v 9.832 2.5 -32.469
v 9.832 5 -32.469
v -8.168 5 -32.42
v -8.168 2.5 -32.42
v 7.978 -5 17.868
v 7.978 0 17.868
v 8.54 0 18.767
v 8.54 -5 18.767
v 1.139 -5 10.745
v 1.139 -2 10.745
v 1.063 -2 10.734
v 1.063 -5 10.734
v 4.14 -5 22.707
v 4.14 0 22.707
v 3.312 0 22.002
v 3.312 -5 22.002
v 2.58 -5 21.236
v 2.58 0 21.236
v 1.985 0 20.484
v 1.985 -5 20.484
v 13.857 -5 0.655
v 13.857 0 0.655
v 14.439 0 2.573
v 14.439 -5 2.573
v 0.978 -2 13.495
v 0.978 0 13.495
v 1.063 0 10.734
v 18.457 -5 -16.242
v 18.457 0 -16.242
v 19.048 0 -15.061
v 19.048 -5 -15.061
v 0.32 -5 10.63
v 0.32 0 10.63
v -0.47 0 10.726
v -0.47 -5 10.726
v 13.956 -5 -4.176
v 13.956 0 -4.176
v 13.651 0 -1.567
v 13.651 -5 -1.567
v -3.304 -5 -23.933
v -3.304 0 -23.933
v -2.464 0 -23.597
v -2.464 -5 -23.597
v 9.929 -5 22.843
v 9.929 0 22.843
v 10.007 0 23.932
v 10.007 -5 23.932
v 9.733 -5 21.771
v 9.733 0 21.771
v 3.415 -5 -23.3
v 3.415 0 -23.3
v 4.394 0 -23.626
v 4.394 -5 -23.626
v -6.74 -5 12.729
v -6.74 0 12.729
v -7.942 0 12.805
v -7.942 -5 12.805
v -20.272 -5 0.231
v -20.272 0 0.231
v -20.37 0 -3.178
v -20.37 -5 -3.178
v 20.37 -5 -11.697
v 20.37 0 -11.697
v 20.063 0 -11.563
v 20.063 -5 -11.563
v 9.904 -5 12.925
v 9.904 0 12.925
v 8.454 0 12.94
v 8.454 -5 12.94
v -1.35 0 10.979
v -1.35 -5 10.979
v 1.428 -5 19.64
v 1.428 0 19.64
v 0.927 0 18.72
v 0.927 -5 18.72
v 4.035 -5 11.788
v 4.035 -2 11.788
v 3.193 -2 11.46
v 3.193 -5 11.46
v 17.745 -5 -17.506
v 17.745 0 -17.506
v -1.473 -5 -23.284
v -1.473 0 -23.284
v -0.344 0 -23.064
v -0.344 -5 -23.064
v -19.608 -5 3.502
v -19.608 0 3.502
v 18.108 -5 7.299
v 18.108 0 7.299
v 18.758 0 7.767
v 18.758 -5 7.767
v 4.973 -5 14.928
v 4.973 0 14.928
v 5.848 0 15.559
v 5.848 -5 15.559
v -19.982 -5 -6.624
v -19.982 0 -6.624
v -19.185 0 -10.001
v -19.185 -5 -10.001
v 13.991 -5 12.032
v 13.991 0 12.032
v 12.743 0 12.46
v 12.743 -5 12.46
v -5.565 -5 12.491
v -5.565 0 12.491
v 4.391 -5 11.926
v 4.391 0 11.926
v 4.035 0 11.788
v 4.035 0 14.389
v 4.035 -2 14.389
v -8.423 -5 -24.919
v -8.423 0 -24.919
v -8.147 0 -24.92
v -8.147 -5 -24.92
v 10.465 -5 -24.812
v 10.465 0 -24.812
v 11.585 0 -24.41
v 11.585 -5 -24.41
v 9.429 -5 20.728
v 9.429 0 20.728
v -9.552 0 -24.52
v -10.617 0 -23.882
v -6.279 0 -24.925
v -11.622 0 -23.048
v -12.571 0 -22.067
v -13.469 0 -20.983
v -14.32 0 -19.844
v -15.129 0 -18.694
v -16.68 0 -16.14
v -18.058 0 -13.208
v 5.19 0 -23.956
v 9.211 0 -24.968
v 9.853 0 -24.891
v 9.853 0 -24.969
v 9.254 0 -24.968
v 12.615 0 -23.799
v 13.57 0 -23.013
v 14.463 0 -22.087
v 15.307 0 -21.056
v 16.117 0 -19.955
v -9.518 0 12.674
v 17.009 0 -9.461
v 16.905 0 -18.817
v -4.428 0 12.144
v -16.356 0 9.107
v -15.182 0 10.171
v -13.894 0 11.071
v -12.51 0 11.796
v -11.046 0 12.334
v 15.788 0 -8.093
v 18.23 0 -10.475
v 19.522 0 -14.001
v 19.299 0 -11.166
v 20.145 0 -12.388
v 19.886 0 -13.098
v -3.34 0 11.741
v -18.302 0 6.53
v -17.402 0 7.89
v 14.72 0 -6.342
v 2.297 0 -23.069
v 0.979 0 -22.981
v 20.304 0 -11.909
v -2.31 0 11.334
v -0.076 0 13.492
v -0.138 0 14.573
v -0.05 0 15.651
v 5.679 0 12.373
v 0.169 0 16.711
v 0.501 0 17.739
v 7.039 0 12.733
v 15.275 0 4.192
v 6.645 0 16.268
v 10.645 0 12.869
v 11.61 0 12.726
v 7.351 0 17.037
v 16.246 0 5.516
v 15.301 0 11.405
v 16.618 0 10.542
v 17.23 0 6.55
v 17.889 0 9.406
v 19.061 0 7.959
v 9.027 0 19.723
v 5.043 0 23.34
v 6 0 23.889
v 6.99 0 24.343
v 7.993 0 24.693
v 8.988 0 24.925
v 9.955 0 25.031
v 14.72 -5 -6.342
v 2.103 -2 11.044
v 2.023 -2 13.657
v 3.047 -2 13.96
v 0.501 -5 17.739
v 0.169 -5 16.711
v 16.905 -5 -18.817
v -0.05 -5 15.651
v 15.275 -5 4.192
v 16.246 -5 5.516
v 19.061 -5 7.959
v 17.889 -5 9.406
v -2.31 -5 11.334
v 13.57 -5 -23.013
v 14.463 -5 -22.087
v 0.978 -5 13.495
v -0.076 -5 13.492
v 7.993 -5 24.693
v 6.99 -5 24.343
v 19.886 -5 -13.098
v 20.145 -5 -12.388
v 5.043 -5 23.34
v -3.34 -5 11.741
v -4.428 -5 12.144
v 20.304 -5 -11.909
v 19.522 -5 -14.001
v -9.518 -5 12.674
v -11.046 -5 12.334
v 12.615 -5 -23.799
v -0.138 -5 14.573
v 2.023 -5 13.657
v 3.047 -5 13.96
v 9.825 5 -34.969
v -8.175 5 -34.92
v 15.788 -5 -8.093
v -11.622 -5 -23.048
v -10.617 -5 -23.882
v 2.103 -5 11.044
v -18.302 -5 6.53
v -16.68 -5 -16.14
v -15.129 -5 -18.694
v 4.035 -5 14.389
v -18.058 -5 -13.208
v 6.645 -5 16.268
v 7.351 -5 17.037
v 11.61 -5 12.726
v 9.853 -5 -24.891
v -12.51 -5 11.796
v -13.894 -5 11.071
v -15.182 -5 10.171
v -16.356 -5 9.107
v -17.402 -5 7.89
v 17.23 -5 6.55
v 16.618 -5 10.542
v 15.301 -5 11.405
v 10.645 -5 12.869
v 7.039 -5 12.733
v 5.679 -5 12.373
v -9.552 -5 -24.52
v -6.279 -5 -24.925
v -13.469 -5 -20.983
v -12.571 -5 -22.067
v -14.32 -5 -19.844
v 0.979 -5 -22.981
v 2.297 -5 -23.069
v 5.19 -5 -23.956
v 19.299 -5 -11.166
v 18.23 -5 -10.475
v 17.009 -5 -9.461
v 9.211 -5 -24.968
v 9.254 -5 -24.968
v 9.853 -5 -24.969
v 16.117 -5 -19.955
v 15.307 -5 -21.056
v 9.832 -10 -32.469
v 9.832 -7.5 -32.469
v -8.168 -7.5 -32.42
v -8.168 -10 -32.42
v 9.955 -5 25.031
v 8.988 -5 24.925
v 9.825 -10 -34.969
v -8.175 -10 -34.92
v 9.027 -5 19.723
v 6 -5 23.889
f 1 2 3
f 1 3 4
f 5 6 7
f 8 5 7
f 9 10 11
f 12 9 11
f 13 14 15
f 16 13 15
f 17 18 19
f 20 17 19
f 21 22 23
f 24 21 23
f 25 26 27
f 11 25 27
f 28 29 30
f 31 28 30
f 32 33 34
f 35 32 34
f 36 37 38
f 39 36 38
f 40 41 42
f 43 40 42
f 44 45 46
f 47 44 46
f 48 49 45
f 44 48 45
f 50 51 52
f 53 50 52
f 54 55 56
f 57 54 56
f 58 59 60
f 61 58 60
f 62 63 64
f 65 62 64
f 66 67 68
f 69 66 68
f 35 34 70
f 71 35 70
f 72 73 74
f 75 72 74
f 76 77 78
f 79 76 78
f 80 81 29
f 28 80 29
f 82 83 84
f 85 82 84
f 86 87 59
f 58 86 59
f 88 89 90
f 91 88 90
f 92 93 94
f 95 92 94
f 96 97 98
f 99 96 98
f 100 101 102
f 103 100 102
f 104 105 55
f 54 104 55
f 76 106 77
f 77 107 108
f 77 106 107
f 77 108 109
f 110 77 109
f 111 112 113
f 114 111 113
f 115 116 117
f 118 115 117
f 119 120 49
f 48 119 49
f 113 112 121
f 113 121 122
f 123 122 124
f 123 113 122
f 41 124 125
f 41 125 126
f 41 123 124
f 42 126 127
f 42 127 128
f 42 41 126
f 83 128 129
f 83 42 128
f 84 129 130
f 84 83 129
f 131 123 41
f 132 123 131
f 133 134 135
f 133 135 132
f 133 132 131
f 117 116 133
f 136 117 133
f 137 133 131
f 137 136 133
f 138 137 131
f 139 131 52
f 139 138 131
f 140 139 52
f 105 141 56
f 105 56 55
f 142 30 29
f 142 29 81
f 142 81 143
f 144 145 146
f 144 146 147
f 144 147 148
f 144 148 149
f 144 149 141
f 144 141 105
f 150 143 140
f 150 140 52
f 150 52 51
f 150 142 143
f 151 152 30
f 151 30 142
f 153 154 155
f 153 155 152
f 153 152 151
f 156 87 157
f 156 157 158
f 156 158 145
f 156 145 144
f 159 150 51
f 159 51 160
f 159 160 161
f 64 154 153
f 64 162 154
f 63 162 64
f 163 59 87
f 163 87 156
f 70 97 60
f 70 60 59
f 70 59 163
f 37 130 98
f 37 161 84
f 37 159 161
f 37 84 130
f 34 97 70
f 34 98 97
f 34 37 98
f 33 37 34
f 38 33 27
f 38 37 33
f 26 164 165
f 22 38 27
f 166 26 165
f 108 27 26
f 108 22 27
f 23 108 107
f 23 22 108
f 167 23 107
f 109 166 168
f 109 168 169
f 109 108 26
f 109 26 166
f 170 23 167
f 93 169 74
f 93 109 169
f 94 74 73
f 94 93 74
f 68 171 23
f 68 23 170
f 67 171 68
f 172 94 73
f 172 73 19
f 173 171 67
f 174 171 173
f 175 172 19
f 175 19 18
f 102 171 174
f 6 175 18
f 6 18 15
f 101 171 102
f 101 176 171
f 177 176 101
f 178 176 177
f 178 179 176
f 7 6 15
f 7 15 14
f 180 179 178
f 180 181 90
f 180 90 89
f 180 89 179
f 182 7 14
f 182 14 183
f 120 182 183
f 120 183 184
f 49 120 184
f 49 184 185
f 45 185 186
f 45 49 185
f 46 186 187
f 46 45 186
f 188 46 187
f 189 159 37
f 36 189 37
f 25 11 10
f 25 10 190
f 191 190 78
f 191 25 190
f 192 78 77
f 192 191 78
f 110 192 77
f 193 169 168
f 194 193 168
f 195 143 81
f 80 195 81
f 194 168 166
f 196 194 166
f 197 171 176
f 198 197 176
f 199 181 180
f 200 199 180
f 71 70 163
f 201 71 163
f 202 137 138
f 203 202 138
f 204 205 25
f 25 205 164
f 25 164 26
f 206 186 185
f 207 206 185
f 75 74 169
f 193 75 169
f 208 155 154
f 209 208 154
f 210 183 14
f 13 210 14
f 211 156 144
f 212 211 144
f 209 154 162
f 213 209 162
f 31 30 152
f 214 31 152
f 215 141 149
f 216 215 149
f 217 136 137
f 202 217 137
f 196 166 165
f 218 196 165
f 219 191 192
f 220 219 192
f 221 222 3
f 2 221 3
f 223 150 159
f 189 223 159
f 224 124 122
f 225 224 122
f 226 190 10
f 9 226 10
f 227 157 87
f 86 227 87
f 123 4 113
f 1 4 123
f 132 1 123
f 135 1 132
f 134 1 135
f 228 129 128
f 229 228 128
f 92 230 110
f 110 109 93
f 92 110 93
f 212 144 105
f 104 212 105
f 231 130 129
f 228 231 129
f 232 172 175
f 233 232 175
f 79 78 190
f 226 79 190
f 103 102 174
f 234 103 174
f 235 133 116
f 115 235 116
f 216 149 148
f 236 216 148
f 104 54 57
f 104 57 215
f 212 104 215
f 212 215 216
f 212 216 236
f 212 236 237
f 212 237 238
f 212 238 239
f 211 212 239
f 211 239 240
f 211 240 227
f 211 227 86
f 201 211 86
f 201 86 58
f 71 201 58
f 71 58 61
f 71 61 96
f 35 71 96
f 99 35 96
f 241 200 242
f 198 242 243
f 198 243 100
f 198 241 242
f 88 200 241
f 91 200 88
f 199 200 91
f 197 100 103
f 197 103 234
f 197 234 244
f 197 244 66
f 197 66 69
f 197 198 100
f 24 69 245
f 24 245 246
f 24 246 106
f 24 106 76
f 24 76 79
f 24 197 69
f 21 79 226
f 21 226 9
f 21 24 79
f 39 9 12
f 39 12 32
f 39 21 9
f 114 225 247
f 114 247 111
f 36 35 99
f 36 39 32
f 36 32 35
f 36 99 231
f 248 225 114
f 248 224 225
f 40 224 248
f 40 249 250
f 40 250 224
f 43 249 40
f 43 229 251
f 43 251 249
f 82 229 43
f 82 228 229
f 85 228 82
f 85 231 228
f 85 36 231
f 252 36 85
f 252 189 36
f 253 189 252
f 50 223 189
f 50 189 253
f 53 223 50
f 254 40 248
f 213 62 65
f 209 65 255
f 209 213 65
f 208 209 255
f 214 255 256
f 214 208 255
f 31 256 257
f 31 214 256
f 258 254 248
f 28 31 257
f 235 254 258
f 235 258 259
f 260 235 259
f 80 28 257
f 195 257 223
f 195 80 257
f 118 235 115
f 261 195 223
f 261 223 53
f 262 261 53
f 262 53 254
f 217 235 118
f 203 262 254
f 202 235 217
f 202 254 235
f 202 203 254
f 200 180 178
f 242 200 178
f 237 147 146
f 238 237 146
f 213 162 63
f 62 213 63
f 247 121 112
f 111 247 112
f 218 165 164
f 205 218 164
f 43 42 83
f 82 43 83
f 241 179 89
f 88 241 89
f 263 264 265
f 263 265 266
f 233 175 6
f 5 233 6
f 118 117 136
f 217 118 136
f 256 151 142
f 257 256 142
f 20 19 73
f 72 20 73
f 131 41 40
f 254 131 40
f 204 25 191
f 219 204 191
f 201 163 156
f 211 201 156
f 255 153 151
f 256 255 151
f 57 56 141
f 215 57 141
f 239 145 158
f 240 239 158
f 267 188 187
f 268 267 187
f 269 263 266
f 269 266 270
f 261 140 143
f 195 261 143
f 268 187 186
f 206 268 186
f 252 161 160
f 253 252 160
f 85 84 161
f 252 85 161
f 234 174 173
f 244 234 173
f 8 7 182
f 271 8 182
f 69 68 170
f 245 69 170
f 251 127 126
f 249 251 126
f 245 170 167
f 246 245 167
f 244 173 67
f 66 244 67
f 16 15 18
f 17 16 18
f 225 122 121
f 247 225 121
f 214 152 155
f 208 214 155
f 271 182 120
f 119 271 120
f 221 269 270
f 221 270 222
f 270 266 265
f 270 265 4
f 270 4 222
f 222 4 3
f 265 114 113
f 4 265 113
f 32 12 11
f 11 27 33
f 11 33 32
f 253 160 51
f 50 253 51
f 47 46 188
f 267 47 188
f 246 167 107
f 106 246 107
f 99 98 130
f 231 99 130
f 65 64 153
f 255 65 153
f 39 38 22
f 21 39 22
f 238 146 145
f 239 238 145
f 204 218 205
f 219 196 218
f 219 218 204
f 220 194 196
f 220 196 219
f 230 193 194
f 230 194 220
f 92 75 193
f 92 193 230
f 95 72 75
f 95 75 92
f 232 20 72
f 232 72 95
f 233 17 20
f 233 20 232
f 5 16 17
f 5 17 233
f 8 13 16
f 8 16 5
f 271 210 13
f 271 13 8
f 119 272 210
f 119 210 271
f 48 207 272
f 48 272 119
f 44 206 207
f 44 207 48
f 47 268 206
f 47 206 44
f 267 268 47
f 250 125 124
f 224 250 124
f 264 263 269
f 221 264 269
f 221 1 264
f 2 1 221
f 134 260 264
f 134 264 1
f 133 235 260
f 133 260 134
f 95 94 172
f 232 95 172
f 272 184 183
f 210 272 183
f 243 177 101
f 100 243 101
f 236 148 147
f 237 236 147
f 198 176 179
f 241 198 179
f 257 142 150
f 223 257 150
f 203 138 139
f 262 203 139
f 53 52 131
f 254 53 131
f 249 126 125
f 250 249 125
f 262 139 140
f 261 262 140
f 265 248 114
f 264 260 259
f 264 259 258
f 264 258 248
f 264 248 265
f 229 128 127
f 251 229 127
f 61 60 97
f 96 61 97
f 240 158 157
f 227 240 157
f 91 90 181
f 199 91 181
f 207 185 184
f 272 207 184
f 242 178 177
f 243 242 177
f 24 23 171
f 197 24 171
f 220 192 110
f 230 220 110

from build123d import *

# Parameters (mm, degrees)
F1_DEPTH = 2
F2_DEPTH = 5
F5_DEPTH = 18


# Not quite as in the source:
# - ends of sketch curves that miss each other by under 0.0002 mm in the source are joined


with BuildPart() as f1:
    # F0 (on Front) → F1 (new body)
    with BuildSketch(Plane.XZ):
        Polygon((13.9564371829, -4.1763302545), (13.6505568212, -1.5672102939), (13.8570021684, 0.6546701968), (14.4386421574, 2.572777133), (15.2749946567, 4.1916956816), (16.2455787436, 5.5160118155), (17.2299147044, 6.5503102987), (18.1075224224, 7.29917791), (18.7579217808, 7.7671990103), (19.0606326631, 7.9589595725), (17.8894090385, 9.4061765559), (16.6182390109, 10.5424416074), (15.3009021796, 11.4051715106), (13.991178144, 12.0317814369), (12.7428465032, 12.45968817), (11.6096864535, 12.7263080903), (10.6454779973, 12.8690567726), (9.9040003307, 12.9253510002), (8.4536993007, 12.9401075165), (7.0393171578, 12.7333035124), (5.6789414949, 12.3726223866), (4.3906586959, 11.9257463288), (4.0349177671, 11.7875631309), (3.1925567568, 11.4603583345), (2.1027220613, 11.0441405935), (1.1392422025, 10.7447756984), (1.0630562956, 10.7340944764), (0.3202043703, 10.6299470477), (-0.4697068924, 10.7259466125), (-1.3499739104, 10.9785104051), (-2.3101170508, 11.3344870803), (-3.3396570834, 11.740725293), (-4.428114778, 12.144073295), (-5.5650109045, 12.4913797411), (-6.7398666357, 12.7294928833), (-7.9422027416, 12.8052613763), (-9.5179845331, 12.6738502829), (-11.0461403111, 12.3335924529), (-12.5103628719, 11.7956320422), (-13.8943458175, 11.0711148186), (-15.1817823473, 10.171185744), (-16.3563656605, 9.1069897803), (-17.4017889563, 7.8896718894), (-18.3017458369, 6.530377436), (-19.6083064378, 3.5020943147), (-20.2715944756, 0.231420362), (-20.3699313552, -3.1782734497), (-19.9816400935, -6.6236177604), (-19.1850429015, -10.0012415978), (-18.0584619901, -13.2077743927), (-16.6802199733, -16.139845979), (-15.1286390619, -18.6940861905), (-14.3199712507, -19.8437521157), (-13.468975877, -20.9834397215), (-12.5711806097, -22.0670519206), (-11.6221131177, -23.0484932379), (-10.617301876, -23.881667795), (-9.5522737476, -24.5204789077), (-8.4225572075, -24.9188306978), (-6.2785486616, -24.924760094), (-6.1172446521, -24.9066919741), (-5.1420524281, -24.6576772732), (-4.2440729965, -24.3272277028), (-3.3692761011, -23.9589889904), (-2.4636318887, -23.5966060577), (-1.4731105063, -23.2837238261), (-0.3436821007, -23.0639884263), (0.9786835843, -22.9810443767), (2.2966708338, -23.0689926979), (3.415326636, -23.3003344778), (4.3935835633, -23.6263149411), (5.2903729793, -23.9981789094), (6.1646270535, -24.3671716073), (7.0752771494, -24.6845382594), (8.0812554366, -24.9015236875), (9.211135995, -24.9675978327), (9.2543495324, -24.9677173425), (10.4646266505, -24.8118393056), (11.5846824237, -24.4101431404), (12.6153226062, -23.7990147009), (13.5702096091, -23.0131824556), (14.4630054406, -22.087375679), (15.3073721089, -21.0563232426), (16.1169720251, -19.9547548237), (16.9054676003, -18.817399697), (17.7450979821, -17.5059903767), (18.4573257656, -16.2416880249), (19.0477701778, -15.0611340813), (19.522050849, -14.0009703886), (19.8857874094, -13.0978387898), (20.1446002953, -12.3883807244), (20.3041087338, -11.9092380354), (20.3699323552, -11.6970525654), (20.0632597243, -11.5632690975), (19.2992902384, -11.1660557409), (18.2304933913, -10.4753497913), (17.0093394832, -9.461087335), (15.7882988139, -8.0932056676), (14.7198412805, -6.3416408756), align=None)
        Polygon((3.1925567568, 11.4603583345), (4.0349177671, 11.7875631309), (4.0349177671, 14.3890940084), (3.0470887296, 13.9600045134), (2.0233786856, 13.6566557055), (0.9776241359, 13.4953402808), (1.0630562956, 10.7340944764), (1.1392422025, 10.7447756984), (2.1027220613, 11.0441405935), align=None)
        Polygon((3.0470887296, 13.9600045134), (4.0349177671, 14.3890940084), (4.9730284914, 14.9276318971), (5.8475844015, 15.5593258862), (6.6447481909, 16.2678824734), (7.3506829556, 17.0370097684), (7.9776442852, 17.8678175927), (8.5401819643, 18.7665723681), (9.0274431955, 19.7233570289), (9.4285759872, 20.7282545094), (9.7327275419, 21.7713473411), (9.9290458681, 22.8427184583), (10.0066785712, 23.9324507955), (9.9547732566, 25.030626884), (8.9884152767, 24.9252998211), (7.9933494289, 24.6925222045), (6.9902835166, 24.3433068169), (5.9999257462, 23.888667247), (5.0429839212, 23.3396154714), (4.1401666508, 22.7071646759), (3.3121821416, 22.0023272402), (2.5797377939, 21.2361167529), (1.9848069462, 20.4835481245), (1.4275088821, 19.6401188001), (0.9265880606, 18.7204873704), (0.5007873288, 17.7393128294), (0.1688511456, 16.7112529619), (-0.0504776421, 15.6509671648), (-0.1384553812, 14.5731136257), (-0.0763380157, 13.4923513387), (0.9776241359, 13.4953402808), (2.0233786856, 13.6566557055), align=None)
    extrude(amount=F1_DEPTH)

    # F0 (on Front) → F2 (join)
    with BuildSketch(Plane.XZ):
        Polygon((13.9564371829, -4.1763302545), (13.6505568212, -1.5672102939), (13.8570021684, 0.6546701968), (14.4386421574, 2.572777133), (15.2749946567, 4.1916956816), (16.2455787436, 5.5160118155), (17.2299147044, 6.5503102987), (18.1075224224, 7.29917791), (18.7579217808, 7.7671990103), (19.0606326631, 7.9589595725), (17.8894090385, 9.4061765559), (16.6182390109, 10.5424416074), (15.3009021796, 11.4051715106), (13.991178144, 12.0317814369), (12.7428465032, 12.45968817), (11.6096864535, 12.7263080903), (10.6454779973, 12.8690567726), (9.9040003307, 12.9253510002), (8.4536993007, 12.9401075165), (7.0393171578, 12.7333035124), (5.6789414949, 12.3726223866), (4.3906586959, 11.9257463288), (4.0349177671, 11.7875631309), (3.1925567568, 11.4603583345), (2.1027220613, 11.0441405935), (1.1392422025, 10.7447756984), (1.0630562956, 10.7340944764), (0.3202043703, 10.6299470477), (-0.4697068924, 10.7259466125), (-1.3499739104, 10.9785104051), (-2.3101170508, 11.3344870803), (-3.3396570834, 11.740725293), (-4.428114778, 12.144073295), (-5.5650109045, 12.4913797411), (-6.7398666357, 12.7294928833), (-7.9422027416, 12.8052613763), (-9.5179845331, 12.6738502829), (-11.0461403111, 12.3335924529), (-12.5103628719, 11.7956320422), (-13.8943458175, 11.0711148186), (-15.1817823473, 10.171185744), (-16.3563656605, 9.1069897803), (-17.4017889563, 7.8896718894), (-18.3017458369, 6.530377436), (-19.6083064378, 3.5020943147), (-20.2715944756, 0.231420362), (-20.3699313552, -3.1782734497), (-19.9816400935, -6.6236177604), (-19.1850429015, -10.0012415978), (-18.0584619901, -13.2077743927), (-16.6802199733, -16.139845979), (-15.1286390619, -18.6940861905), (-14.3199712507, -19.8437521157), (-13.468975877, -20.9834397215), (-12.5711806097, -22.0670519206), (-11.6221131177, -23.0484932379), (-10.617301876, -23.881667795), (-9.5522737476, -24.5204789077), (-8.4225572075, -24.9188306978), (-6.2785486616, -24.924760094), (-6.1172446521, -24.9066919741), (-5.1420524281, -24.6576772732), (-4.2440729965, -24.3272277028), (-3.3692761011, -23.9589889904), (-2.4636318887, -23.5966060577), (-1.4731105063, -23.2837238261), (-0.3436821007, -23.0639884263), (0.9786835843, -22.9810443767), (2.2966708338, -23.0689926979), (3.415326636, -23.3003344778), (4.3935835633, -23.6263149411), (5.2903729793, -23.9981789094), (6.1646270535, -24.3671716073), (7.0752771494, -24.6845382594), (8.0812554366, -24.9015236875), (9.211135995, -24.9675978327), (9.2543495324, -24.9677173425), (10.4646266505, -24.8118393056), (11.5846824237, -24.4101431404), (12.6153226062, -23.7990147009), (13.5702096091, -23.0131824556), (14.4630054406, -22.087375679), (15.3073721089, -21.0563232426), (16.1169720251, -19.9547548237), (16.9054676003, -18.817399697), (17.7450979821, -17.5059903767), (18.4573257656, -16.2416880249), (19.0477701778, -15.0611340813), (19.522050849, -14.0009703886), (19.8857874094, -13.0978387898), (20.1446002953, -12.3883807244), (20.3041087338, -11.9092380354), (20.3699323552, -11.6970525654), (20.0632597243, -11.5632690975), (19.2992902384, -11.1660557409), (18.2304933913, -10.4753497913), (17.0093394832, -9.461087335), (15.7882988139, -8.0932056676), (14.7198412805, -6.3416408756), align=None)
        Polygon((3.0470887296, 13.9600045134), (4.0349177671, 14.3890940084), (4.9730284914, 14.9276318971), (5.8475844015, 15.5593258862), (6.6447481909, 16.2678824734), (7.3506829556, 17.0370097684), (7.9776442852, 17.8678175927), (8.5401819643, 18.7665723681), (9.0274431955, 19.7233570289), (9.4285759872, 20.7282545094), (9.7327275419, 21.7713473411), (9.9290458681, 22.8427184583), (10.0066785712, 23.9324507955), (9.9547732566, 25.030626884), (8.9884152767, 24.9252998211), (7.9933494289, 24.6925222045), (6.9902835166, 24.3433068169), (5.9999257462, 23.888667247), (5.0429839212, 23.3396154714), (4.1401666508, 22.7071646759), (3.3121821416, 22.0023272402), (2.5797377939, 21.2361167529), (1.9848069462, 20.4835481245), (1.4275088821, 19.6401188001), (0.9265880606, 18.7204873704), (0.5007873288, 17.7393128294), (0.1688511456, 16.7112529619), (-0.0504776421, 15.6509671648), (-0.1384553812, 14.5731136257), (-0.0763380157, 13.4923513387), (0.9776241359, 13.4953402808), (2.0233786856, 13.6566557055), align=None)
    extrude(amount=F2_DEPTH)

    # F4 (on line) → F5 (join)
    with BuildSketch(Plane(origin=(9.921820884, 0, -0.0274394463), x_dir=(0, 1, 0), z_dir=(0.9999961758, 0, -0.002765555))):
        Polygon((0, -24.9420284495), (-2.5, -24.9420284495), (-2.5, -34.9420284495), (5, -34.9420284495), (5, -32.4420284495), (2.5, -32.4420284495), align=None)
        Polygon((-2.5, -24.9420284495), (-5, -24.9420284495), (-7.5, -32.4420284495), (-10, -32.4420284495), (-10, -34.9420284495), (-2.5, -34.9420284495), align=None)
        Polygon((-5, -23.9420284495), (-5, -24.9420284495), (-2.5, -24.9420284495), (0, -24.9420284495), (0, -23.9420284495), align=None)
    extrude(amount=-F5_DEPTH)


solid = f1.part
